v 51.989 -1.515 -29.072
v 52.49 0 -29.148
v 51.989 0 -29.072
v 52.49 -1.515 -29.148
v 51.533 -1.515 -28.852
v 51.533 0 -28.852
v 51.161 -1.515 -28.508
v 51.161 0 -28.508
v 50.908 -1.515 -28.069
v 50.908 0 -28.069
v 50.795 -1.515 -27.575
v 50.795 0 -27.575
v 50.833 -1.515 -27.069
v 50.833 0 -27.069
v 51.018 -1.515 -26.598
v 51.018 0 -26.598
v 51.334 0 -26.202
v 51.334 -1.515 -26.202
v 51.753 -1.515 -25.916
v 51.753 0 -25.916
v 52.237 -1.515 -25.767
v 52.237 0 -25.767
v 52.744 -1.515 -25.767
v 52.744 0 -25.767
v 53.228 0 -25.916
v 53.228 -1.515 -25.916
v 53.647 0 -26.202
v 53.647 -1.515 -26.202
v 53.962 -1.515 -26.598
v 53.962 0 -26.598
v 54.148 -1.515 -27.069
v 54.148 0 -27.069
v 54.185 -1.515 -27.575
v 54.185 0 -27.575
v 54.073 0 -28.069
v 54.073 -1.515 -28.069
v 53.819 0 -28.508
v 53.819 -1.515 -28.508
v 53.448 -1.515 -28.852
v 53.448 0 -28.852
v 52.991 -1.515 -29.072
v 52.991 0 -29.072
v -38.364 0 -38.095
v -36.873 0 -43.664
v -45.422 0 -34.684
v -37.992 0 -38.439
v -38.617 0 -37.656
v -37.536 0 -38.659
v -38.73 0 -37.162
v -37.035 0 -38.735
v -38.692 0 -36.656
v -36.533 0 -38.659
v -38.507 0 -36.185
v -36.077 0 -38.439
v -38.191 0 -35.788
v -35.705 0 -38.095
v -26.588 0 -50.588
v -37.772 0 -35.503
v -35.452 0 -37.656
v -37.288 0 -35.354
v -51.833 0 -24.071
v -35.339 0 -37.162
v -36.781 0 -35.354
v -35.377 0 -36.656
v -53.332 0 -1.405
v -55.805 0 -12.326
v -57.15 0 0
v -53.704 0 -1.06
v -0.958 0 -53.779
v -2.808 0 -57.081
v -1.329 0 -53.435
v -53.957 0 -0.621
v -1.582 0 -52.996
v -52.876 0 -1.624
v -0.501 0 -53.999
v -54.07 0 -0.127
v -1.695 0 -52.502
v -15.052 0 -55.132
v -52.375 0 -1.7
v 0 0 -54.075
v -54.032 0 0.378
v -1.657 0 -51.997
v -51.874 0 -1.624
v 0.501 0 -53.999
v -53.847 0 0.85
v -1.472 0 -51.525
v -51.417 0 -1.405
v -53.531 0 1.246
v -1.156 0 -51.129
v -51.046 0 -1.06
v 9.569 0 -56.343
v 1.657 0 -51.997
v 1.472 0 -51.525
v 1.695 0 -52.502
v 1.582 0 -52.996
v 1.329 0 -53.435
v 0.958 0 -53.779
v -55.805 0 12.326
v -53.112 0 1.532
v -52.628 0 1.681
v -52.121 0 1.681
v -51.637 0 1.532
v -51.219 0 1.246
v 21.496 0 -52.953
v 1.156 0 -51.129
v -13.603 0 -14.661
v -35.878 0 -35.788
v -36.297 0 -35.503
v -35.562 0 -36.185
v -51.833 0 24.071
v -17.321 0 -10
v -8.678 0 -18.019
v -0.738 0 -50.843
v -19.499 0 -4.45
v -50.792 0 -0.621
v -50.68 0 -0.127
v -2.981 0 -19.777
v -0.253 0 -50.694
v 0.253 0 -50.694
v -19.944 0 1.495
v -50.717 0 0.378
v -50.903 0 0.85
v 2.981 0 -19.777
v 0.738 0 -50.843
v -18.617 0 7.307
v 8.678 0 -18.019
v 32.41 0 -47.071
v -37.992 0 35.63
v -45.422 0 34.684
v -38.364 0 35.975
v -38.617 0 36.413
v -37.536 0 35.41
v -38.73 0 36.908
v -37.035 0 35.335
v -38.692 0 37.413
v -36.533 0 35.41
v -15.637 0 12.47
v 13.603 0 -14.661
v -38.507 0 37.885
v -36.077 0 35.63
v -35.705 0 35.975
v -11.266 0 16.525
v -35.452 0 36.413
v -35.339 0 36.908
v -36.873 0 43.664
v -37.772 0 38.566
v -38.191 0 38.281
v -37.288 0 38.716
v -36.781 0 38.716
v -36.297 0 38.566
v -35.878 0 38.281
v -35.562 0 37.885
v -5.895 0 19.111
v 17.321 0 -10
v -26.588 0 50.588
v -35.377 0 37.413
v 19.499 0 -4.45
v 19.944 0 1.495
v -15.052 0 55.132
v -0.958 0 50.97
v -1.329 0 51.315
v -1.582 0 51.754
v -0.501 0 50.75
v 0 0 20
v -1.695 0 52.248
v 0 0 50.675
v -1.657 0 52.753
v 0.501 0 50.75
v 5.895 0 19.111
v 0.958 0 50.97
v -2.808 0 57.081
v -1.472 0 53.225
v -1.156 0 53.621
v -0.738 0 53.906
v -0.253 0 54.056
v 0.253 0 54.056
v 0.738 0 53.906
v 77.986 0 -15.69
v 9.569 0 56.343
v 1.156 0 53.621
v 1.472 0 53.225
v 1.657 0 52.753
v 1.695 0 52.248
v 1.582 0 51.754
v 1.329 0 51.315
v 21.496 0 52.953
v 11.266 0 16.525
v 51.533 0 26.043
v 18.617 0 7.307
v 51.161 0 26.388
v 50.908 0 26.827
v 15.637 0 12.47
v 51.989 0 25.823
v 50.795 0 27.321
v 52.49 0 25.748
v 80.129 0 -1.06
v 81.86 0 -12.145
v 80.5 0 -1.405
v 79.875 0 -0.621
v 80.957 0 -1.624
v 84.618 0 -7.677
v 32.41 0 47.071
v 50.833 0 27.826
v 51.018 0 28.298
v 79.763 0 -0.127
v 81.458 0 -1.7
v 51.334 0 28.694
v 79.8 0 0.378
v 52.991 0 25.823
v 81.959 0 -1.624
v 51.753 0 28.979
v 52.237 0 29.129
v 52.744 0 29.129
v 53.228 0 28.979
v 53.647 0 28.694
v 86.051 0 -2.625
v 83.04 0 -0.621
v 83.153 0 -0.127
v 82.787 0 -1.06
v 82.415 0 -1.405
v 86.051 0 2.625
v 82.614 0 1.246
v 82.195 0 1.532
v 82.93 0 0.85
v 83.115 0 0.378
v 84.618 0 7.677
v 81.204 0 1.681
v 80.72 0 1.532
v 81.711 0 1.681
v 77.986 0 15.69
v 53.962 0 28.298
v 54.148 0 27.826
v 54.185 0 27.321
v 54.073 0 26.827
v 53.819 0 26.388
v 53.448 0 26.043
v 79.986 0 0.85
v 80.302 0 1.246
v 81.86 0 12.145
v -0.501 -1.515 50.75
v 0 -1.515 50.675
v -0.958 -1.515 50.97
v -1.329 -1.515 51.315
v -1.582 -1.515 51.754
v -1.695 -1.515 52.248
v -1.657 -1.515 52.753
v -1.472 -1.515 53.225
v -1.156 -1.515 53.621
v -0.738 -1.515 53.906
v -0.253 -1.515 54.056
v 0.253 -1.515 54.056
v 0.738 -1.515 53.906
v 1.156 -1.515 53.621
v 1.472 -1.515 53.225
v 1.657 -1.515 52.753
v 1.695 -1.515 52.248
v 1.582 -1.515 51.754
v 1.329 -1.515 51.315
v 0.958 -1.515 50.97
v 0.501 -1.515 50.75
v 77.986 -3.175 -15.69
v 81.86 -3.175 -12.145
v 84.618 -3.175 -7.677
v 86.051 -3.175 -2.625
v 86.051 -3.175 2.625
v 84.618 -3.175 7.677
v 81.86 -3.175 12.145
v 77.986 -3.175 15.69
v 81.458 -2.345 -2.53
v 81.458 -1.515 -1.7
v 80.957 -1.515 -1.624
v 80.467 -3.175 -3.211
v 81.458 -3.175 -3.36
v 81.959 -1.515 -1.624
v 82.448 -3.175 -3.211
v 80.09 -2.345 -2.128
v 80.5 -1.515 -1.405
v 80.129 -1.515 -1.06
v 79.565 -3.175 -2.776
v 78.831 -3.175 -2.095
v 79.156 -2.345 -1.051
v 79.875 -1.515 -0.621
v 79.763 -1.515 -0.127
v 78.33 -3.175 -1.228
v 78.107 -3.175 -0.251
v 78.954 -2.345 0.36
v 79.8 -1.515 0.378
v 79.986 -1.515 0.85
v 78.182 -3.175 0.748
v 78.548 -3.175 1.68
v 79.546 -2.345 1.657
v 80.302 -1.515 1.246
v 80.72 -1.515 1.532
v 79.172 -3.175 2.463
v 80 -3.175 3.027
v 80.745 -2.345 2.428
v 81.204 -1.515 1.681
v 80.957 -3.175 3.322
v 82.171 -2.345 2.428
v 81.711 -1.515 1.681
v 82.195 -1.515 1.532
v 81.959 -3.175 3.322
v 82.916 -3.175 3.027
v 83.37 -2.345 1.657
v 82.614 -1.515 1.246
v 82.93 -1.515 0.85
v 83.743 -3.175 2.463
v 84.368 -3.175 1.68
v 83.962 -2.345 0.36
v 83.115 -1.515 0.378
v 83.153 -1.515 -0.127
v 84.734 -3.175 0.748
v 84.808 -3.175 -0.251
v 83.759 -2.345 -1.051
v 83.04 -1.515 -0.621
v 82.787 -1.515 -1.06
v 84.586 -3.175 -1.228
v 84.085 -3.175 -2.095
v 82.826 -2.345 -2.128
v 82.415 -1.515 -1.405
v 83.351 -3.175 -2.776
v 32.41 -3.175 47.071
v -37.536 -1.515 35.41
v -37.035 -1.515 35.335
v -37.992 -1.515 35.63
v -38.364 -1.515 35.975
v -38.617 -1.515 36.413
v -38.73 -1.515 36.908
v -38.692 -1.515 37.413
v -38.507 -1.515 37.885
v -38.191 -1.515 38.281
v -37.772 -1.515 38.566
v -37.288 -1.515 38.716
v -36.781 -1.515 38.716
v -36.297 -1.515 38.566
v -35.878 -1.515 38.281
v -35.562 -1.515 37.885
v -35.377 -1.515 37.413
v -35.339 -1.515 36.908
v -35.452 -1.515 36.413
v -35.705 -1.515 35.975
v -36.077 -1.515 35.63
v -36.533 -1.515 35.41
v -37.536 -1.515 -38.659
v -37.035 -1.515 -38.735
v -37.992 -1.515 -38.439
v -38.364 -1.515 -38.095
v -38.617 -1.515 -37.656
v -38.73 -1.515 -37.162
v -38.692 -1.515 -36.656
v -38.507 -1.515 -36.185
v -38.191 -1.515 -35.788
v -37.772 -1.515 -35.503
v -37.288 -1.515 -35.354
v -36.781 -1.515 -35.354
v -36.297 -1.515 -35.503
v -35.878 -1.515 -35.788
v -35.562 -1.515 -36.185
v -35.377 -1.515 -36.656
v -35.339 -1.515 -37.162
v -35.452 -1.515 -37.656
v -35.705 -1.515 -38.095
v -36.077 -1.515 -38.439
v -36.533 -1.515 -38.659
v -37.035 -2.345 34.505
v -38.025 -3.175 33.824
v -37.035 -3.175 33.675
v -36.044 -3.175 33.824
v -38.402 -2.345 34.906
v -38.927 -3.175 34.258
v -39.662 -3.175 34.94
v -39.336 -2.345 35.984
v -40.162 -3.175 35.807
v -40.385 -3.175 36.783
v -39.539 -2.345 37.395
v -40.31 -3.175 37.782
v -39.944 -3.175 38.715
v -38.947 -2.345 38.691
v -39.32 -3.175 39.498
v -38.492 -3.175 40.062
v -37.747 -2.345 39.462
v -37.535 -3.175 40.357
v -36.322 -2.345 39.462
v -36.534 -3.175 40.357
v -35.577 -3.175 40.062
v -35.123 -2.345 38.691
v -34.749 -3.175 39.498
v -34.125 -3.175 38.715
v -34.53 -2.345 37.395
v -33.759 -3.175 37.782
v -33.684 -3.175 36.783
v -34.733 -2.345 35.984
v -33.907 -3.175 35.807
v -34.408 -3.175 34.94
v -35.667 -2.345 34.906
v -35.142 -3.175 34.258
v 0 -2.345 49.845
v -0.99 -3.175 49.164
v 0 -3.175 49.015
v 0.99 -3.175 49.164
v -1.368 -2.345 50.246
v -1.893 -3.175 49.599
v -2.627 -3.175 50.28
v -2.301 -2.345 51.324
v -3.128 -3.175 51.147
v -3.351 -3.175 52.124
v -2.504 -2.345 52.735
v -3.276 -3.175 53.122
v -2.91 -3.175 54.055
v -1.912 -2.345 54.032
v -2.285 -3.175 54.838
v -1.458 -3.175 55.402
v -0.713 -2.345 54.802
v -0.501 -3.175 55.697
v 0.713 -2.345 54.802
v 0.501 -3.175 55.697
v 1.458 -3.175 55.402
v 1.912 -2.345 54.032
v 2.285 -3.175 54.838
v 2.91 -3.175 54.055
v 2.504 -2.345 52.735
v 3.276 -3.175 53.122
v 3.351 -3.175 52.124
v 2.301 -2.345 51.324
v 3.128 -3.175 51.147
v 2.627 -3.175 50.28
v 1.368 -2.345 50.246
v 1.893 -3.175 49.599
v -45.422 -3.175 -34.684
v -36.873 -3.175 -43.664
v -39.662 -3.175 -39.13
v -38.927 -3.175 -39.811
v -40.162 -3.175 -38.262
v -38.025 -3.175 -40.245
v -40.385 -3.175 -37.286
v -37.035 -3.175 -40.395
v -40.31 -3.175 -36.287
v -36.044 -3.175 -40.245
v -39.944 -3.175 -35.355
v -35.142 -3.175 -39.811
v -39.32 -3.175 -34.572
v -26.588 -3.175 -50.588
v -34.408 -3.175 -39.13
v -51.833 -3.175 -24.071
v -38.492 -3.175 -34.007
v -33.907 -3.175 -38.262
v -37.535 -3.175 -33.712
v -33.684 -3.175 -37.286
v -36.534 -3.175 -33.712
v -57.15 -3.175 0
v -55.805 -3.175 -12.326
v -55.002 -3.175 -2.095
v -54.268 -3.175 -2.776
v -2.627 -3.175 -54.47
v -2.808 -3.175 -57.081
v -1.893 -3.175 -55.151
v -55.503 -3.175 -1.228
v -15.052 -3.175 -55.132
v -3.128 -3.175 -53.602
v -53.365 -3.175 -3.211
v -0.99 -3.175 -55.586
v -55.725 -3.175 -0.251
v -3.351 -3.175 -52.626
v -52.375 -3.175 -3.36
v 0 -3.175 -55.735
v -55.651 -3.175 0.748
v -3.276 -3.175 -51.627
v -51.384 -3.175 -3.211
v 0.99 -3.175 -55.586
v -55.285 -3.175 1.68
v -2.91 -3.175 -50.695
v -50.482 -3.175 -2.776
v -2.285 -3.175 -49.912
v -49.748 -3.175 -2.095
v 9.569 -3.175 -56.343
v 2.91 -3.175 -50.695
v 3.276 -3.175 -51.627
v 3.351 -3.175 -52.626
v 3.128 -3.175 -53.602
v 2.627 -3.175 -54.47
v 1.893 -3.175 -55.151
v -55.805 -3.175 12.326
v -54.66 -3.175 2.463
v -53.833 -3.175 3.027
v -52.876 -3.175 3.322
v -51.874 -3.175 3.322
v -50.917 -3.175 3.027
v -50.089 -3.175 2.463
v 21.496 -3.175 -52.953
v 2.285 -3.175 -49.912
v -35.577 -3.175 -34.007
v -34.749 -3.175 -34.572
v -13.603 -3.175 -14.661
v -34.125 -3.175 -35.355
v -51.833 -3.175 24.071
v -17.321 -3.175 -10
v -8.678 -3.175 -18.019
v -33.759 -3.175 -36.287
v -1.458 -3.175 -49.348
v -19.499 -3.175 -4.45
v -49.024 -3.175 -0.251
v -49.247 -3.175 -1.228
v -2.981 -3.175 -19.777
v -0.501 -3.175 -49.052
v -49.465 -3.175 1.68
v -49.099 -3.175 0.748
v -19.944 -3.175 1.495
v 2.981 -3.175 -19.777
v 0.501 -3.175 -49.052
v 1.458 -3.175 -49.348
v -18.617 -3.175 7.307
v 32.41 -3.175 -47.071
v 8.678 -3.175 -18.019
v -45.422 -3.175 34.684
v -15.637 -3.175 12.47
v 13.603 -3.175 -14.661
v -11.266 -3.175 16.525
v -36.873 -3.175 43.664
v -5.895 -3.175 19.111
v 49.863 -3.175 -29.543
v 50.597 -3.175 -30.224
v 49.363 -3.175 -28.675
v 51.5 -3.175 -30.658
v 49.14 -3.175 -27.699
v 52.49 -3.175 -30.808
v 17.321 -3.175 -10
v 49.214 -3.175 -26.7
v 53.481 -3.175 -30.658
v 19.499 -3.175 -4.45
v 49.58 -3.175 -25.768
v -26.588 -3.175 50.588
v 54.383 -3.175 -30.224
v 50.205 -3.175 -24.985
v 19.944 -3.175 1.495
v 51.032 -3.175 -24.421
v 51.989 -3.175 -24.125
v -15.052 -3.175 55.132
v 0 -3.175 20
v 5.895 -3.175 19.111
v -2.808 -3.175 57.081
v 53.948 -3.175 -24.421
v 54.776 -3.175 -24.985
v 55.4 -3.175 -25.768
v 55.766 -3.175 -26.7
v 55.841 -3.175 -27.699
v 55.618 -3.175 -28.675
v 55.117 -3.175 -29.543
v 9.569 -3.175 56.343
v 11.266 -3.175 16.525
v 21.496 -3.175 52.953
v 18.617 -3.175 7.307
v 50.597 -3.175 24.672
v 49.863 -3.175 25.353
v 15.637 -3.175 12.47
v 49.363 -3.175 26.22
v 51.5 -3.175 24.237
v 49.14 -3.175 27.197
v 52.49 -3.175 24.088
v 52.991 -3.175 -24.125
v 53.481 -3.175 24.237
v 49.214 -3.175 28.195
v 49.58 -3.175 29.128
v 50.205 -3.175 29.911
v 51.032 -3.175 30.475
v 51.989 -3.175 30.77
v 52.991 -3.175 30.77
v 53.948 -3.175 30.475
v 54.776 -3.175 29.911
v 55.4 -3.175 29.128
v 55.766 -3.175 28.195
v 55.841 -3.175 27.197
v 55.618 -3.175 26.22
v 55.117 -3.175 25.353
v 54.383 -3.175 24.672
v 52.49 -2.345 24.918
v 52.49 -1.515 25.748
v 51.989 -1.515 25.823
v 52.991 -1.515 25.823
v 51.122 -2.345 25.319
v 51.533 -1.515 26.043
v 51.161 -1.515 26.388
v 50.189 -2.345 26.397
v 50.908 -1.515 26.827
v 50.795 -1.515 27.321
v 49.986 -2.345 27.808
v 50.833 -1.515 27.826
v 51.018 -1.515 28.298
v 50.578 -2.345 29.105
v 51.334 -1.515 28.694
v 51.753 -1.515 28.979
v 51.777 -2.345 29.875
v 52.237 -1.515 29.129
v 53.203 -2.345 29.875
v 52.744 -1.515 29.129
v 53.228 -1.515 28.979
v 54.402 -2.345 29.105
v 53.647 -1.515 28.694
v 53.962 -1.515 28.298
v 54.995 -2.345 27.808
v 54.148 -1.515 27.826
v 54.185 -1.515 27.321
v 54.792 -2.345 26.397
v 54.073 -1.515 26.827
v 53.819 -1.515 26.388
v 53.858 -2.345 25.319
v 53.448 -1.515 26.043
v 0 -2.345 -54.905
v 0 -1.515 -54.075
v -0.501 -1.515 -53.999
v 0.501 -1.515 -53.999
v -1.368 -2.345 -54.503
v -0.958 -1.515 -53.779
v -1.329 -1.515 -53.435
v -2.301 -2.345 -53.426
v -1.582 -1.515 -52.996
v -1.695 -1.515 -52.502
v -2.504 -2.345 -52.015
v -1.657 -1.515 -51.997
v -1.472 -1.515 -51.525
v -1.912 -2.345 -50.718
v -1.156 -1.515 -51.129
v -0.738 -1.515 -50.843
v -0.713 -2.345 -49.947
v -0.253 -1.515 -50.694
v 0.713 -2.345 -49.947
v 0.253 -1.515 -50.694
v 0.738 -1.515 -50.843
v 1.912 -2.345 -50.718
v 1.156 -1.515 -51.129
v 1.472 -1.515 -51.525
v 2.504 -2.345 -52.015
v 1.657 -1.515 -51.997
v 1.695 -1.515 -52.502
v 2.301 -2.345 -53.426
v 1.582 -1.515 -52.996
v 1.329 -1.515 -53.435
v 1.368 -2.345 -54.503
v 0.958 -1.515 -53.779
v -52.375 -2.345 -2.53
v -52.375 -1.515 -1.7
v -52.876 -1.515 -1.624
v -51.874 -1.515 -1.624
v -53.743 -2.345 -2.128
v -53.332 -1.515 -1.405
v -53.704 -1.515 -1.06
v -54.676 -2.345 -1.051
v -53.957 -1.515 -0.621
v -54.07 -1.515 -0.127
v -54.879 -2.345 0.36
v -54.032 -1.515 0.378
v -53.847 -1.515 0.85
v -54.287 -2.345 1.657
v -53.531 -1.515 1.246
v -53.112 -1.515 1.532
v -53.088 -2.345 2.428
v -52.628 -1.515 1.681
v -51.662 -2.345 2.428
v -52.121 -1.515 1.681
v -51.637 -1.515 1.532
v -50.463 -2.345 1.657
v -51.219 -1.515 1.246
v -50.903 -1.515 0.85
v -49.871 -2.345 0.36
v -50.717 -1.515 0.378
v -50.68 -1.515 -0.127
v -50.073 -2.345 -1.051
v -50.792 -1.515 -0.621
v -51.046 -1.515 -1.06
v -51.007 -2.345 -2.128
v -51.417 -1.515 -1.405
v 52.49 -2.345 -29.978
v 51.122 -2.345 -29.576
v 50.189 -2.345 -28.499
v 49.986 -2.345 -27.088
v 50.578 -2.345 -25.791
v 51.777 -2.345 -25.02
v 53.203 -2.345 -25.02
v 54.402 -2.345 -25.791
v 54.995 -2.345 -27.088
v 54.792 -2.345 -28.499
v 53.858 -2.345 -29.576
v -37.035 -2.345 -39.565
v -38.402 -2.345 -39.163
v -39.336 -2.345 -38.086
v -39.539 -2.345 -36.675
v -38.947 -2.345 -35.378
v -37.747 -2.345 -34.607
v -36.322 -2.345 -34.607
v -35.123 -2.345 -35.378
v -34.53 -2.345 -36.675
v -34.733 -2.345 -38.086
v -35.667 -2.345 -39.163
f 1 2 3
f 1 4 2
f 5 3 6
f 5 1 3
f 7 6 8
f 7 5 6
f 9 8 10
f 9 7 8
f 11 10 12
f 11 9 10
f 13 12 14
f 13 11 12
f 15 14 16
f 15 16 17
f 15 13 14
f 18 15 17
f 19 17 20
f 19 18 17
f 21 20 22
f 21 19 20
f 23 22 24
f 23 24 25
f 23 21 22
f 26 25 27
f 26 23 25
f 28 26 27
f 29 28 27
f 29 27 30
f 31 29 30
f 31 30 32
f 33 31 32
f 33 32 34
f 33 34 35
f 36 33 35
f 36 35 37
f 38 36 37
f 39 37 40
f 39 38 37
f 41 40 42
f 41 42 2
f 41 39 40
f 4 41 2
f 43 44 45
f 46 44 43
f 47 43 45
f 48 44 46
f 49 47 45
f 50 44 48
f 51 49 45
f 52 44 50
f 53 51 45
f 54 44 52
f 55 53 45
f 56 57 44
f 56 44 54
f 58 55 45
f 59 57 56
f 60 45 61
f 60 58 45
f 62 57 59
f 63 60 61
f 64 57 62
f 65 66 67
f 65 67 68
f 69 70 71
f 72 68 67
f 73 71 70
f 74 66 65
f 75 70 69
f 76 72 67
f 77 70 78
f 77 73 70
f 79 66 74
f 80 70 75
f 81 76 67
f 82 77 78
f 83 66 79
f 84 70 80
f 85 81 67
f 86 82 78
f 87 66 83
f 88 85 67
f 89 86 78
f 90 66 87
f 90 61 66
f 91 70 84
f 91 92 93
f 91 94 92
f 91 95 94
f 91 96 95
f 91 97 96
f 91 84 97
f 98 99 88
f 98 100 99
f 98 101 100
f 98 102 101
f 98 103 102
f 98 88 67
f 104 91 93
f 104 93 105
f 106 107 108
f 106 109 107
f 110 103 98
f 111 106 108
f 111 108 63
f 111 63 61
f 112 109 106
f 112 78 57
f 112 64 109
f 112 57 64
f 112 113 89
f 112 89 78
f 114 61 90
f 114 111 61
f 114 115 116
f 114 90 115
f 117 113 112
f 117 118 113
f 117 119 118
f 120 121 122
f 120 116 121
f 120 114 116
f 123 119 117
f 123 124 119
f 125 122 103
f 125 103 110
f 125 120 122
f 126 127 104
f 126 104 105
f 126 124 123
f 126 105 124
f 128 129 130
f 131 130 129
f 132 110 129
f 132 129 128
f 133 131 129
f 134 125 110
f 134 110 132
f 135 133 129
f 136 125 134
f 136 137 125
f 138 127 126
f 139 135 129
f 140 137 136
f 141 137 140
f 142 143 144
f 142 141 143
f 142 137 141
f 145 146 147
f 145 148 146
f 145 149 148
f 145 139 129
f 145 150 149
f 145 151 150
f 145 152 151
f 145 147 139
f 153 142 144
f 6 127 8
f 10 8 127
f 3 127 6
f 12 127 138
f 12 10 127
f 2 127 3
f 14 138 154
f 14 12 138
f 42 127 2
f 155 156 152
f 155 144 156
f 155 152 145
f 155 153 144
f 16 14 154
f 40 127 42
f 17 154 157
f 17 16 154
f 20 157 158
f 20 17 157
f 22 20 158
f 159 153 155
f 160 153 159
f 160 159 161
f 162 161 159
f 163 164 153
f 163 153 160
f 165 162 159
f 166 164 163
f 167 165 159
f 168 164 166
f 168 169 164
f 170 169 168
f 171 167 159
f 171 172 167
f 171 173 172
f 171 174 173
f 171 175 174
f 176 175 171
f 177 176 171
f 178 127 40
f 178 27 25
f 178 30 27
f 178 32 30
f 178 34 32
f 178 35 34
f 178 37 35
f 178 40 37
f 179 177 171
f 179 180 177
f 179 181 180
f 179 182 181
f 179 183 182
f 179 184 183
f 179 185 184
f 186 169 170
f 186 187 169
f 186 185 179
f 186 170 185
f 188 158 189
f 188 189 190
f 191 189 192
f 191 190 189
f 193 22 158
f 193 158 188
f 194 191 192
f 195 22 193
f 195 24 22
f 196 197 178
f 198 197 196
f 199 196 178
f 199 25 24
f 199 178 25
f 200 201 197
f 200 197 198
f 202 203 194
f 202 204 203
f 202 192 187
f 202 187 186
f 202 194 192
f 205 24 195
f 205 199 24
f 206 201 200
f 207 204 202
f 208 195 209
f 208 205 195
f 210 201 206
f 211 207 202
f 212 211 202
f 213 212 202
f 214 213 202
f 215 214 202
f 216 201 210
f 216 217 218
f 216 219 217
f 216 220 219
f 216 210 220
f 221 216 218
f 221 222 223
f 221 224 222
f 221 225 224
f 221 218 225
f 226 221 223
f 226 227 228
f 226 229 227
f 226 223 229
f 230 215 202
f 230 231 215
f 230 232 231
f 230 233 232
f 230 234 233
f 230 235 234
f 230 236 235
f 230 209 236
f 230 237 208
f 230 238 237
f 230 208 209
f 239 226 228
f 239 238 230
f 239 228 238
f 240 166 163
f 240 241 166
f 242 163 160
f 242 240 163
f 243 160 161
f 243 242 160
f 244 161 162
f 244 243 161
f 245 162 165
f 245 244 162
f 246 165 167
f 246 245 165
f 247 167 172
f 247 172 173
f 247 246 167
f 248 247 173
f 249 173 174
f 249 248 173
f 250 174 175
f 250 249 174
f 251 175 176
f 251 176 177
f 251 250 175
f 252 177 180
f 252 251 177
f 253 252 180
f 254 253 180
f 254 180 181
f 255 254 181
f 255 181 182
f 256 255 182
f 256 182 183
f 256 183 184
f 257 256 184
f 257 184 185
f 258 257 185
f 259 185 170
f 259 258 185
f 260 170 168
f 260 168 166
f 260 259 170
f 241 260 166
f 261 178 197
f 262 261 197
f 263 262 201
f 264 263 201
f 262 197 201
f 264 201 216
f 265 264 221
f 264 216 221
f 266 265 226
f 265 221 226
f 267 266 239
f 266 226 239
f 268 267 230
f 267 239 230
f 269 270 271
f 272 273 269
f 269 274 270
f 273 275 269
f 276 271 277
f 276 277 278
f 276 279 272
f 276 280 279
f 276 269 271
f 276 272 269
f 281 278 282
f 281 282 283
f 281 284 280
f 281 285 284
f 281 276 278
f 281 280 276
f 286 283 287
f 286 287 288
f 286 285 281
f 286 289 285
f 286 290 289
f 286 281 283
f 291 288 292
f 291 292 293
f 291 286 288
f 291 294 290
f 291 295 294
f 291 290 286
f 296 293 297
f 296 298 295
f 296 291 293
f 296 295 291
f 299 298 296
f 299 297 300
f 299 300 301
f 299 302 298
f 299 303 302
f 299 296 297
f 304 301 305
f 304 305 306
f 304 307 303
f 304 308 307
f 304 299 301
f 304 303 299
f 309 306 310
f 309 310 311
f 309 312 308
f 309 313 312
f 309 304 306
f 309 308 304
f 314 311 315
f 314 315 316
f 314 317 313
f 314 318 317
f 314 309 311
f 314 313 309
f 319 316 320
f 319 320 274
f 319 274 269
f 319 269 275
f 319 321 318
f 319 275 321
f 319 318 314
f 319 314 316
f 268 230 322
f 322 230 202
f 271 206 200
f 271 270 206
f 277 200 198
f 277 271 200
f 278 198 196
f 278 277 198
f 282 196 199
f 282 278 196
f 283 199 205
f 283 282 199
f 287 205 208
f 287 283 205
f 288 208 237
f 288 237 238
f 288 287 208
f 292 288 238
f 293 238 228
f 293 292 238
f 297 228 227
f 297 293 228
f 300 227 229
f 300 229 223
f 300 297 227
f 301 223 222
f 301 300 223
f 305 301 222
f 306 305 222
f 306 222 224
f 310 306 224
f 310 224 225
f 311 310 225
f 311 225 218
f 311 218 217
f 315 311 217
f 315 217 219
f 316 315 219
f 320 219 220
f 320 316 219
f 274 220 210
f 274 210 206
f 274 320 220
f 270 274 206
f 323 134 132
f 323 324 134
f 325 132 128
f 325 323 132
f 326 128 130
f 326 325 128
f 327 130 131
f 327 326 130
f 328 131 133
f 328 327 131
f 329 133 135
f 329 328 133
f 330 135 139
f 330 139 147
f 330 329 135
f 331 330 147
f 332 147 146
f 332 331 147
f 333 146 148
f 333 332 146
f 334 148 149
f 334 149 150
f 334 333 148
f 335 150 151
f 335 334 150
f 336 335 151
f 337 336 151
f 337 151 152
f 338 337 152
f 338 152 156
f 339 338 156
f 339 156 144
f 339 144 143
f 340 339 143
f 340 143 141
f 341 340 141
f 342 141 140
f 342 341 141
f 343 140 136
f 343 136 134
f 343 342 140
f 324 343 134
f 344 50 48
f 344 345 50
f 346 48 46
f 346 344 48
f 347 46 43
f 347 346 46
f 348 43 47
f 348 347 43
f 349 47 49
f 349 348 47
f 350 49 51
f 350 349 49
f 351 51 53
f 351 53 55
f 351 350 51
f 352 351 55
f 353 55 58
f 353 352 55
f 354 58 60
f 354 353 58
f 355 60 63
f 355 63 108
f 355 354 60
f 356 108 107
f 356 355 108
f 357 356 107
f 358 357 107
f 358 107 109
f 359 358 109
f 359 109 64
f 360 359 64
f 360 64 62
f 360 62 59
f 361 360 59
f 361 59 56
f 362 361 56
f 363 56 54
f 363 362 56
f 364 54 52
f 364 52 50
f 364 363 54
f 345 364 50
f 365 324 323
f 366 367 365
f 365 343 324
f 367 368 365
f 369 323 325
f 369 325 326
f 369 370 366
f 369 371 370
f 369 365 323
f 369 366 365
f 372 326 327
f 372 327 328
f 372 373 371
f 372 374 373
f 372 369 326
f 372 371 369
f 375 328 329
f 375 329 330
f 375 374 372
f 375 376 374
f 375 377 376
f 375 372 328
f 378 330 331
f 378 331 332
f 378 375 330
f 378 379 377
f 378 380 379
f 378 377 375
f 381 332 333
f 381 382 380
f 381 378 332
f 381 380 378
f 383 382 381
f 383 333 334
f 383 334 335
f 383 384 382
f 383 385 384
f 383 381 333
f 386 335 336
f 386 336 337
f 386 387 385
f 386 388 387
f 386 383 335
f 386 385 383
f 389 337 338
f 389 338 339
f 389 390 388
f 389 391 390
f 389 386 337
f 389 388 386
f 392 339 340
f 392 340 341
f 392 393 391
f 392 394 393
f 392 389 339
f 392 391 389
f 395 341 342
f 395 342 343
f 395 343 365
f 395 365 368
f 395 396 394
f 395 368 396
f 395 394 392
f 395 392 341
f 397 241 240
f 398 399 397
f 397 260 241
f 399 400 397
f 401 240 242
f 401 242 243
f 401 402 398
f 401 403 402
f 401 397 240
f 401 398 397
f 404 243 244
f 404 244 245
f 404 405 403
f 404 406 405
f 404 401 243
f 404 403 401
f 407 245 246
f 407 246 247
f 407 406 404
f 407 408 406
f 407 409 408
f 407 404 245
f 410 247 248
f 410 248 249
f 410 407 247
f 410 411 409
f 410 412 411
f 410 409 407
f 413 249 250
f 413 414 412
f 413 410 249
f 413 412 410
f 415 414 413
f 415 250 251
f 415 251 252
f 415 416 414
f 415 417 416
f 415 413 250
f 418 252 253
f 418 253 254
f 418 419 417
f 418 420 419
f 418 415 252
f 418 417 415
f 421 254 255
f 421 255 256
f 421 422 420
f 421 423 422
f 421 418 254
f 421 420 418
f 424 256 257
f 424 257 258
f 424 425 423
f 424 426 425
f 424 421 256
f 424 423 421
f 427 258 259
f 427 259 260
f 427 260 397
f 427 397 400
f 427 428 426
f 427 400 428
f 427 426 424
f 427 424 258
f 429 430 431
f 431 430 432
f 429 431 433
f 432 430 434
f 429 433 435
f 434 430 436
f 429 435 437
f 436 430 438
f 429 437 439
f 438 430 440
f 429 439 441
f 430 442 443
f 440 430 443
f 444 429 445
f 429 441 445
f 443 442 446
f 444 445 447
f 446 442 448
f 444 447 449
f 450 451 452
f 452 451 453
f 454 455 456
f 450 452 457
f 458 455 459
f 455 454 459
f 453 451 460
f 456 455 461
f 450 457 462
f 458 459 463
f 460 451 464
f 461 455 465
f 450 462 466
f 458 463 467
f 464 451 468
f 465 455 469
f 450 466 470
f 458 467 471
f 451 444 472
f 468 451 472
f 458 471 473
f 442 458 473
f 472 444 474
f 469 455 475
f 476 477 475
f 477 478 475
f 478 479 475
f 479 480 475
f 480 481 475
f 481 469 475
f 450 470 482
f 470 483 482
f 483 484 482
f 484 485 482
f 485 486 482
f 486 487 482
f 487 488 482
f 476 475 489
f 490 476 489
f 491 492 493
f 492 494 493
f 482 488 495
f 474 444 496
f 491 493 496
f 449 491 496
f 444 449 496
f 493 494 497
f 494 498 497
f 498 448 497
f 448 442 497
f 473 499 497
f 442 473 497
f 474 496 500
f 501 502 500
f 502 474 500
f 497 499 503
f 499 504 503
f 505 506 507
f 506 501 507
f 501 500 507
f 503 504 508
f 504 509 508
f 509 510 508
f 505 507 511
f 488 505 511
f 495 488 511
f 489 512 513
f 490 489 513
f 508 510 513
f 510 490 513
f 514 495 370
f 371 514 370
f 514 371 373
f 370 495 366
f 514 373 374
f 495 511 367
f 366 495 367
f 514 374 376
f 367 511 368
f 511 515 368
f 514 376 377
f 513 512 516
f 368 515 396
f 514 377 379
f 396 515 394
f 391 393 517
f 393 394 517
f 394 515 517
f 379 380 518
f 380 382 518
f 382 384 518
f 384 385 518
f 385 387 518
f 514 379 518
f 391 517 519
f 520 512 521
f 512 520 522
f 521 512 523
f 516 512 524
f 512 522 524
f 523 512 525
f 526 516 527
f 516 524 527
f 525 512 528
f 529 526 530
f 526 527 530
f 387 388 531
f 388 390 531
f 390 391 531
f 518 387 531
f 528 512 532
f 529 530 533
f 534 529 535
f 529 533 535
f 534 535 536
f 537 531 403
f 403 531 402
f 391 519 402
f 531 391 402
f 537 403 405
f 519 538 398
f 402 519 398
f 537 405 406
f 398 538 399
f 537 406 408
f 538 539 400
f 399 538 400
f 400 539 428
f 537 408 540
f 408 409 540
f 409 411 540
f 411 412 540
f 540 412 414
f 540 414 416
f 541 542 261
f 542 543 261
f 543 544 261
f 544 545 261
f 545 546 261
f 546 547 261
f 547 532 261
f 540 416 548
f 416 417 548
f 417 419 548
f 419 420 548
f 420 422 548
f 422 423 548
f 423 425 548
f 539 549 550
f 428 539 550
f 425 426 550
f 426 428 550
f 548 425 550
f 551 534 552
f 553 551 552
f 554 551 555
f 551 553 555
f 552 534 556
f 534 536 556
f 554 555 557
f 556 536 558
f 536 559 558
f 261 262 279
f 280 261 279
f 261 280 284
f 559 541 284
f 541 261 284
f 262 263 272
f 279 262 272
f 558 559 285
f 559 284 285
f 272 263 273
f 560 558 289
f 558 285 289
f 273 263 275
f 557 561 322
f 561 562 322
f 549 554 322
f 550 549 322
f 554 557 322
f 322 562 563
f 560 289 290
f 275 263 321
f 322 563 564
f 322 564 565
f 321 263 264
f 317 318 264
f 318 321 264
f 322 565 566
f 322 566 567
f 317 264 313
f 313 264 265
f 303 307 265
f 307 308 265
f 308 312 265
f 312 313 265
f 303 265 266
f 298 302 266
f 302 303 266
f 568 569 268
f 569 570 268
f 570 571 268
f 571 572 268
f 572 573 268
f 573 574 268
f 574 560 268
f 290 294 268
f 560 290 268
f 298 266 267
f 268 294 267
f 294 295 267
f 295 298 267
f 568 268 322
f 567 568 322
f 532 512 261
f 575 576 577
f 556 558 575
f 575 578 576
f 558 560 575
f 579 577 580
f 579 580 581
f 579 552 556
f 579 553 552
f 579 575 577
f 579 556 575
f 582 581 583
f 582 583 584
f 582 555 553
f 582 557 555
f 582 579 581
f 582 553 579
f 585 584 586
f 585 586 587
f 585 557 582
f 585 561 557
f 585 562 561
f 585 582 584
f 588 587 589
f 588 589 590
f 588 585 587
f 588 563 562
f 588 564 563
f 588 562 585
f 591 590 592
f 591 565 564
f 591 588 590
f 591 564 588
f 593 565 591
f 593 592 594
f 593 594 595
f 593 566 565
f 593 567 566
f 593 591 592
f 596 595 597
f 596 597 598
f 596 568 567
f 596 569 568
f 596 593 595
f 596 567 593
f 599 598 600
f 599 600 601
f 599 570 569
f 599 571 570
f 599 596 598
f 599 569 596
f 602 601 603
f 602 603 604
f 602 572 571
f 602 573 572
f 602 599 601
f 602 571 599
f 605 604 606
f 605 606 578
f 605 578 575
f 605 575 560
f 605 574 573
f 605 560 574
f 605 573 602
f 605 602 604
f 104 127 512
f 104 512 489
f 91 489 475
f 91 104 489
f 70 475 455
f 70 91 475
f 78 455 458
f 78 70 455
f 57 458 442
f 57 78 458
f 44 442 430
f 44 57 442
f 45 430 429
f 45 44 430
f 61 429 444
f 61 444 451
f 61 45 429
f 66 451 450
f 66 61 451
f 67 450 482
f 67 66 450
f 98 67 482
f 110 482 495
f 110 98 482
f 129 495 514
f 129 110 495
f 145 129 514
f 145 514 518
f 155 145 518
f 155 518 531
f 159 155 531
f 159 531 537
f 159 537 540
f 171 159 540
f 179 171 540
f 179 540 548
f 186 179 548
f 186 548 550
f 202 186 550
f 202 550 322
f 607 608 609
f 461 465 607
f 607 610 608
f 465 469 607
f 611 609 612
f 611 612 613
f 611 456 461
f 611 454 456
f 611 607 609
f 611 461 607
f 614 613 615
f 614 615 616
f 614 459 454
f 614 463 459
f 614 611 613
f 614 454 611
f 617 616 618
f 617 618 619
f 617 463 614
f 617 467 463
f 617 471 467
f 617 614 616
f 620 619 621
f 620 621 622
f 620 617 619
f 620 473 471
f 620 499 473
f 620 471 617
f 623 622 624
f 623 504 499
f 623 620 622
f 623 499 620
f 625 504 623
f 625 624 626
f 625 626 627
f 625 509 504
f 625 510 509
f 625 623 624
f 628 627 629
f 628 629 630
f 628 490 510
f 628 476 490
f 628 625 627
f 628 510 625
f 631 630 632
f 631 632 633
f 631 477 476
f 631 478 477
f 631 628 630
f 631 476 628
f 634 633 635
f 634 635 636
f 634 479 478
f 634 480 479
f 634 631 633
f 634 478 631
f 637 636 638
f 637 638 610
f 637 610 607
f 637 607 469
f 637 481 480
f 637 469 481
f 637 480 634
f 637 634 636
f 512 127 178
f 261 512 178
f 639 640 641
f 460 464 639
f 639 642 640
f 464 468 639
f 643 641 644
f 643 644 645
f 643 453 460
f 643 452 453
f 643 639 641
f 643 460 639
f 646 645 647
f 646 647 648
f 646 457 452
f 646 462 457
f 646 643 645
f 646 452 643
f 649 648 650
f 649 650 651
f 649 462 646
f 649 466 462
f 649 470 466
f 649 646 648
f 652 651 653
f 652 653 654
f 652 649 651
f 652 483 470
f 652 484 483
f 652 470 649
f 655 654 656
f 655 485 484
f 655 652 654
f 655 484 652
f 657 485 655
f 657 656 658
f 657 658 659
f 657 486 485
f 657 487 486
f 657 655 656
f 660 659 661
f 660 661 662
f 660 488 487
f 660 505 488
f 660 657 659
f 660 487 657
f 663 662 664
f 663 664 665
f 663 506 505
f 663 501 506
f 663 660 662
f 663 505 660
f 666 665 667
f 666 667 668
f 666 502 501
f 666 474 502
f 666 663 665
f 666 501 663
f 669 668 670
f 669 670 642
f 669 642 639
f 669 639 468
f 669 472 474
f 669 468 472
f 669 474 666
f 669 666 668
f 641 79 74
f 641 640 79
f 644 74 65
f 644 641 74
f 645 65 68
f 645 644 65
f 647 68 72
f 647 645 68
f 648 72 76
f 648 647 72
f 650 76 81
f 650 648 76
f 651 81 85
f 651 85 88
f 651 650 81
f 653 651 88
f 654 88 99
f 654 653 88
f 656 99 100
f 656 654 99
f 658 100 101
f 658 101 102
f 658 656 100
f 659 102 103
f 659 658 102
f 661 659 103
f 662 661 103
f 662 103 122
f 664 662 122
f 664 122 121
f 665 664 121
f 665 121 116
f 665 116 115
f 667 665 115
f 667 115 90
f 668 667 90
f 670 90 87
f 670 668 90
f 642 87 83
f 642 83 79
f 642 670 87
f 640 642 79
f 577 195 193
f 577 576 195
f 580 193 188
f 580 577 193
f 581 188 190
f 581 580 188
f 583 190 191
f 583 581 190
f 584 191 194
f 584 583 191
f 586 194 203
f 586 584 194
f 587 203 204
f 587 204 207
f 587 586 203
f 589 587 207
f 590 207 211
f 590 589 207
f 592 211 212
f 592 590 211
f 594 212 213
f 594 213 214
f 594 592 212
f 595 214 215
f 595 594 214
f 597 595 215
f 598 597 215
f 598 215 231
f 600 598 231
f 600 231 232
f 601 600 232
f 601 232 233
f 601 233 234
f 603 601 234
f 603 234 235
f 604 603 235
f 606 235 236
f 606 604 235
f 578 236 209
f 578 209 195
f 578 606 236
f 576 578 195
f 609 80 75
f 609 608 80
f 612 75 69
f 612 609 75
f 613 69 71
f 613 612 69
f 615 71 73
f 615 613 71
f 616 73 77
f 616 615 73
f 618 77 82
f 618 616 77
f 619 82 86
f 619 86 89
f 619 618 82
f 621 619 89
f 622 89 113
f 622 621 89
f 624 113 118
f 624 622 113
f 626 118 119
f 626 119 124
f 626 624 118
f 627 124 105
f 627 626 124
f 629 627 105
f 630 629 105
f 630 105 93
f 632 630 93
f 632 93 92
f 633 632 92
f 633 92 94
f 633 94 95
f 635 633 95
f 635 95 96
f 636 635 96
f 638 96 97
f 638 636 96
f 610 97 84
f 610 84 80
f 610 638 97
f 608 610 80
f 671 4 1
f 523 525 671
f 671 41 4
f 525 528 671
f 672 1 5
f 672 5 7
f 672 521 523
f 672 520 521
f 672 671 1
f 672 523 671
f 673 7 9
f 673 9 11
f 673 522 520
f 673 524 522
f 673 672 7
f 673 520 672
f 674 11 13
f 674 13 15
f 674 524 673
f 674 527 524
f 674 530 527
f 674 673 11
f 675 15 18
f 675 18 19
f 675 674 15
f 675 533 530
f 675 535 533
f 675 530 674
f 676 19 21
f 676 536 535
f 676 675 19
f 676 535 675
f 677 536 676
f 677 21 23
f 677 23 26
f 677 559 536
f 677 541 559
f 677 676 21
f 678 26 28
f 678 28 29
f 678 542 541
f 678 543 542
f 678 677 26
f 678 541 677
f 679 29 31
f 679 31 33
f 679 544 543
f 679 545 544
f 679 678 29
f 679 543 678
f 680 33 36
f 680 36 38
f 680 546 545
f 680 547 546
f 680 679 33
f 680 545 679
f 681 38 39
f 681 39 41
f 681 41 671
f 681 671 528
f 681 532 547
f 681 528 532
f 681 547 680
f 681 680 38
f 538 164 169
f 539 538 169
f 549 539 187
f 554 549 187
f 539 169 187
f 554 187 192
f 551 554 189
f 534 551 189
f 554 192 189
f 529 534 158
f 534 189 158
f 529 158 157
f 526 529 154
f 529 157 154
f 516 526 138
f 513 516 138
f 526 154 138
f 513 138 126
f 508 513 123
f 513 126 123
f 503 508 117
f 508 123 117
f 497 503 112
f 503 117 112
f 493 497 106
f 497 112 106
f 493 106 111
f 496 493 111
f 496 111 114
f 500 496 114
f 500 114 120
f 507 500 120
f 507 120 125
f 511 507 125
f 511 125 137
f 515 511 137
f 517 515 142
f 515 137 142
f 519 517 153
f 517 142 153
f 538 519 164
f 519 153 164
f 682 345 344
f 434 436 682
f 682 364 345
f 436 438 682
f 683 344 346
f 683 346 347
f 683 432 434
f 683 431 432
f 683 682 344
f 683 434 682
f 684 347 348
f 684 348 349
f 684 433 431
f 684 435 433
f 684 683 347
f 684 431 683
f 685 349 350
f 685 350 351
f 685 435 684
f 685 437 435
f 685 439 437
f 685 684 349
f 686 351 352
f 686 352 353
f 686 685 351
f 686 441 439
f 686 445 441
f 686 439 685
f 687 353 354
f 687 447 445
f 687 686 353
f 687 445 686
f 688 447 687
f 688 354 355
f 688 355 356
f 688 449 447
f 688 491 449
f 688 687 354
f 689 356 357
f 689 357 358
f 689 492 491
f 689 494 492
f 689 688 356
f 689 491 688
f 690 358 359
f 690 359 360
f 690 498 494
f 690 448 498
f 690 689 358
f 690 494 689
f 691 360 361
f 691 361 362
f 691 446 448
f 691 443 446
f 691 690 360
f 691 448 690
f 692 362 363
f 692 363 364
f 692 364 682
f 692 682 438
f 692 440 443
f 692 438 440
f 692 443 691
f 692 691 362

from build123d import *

# Parameters (mm, degrees)
SKETCH1_R                    = 57.15
SKETCH1_R_2                  = 20
BOSS_EXTRUDE1_DEPTH          = 3.175
BOSS_EXTRUDE2_START          = -3.175
BOSS_EXTRUDE2_DEPTH          = 3.175
CSK_FOR_M3_SFHCS1_AT_2_COUNT = 2
CSK_FOR_M3_SFHCS1_AT_2_PITCH = 74.069152487
CSK_FOR_M3_SFHCS1_AT_3_COUNT = 2
CSK_FOR_M3_SFHCS1_AT_3_PITCH = 96.776011479
CSK_FOR_M3_SFHCS1_AT_4_COUNT = 2
CSK_FOR_M3_SFHCS1_AT_4_PITCH = 104.7496
CSK_FOR_M3_SFHCS1_AT_5_COUNT = 2
CSK_FOR_M3_SFHCS1_AT_5_PITCH = 95.534640107
CSK_FOR_M3_SFHCS1_AT_6_COUNT = 2
CSK_FOR_M3_SFHCS1_AT_6_PITCH = 96.842619006
CSK_FOR_M3_SFHCS1_AT_7_COUNT = 2
CSK_FOR_M3_SFHCS1_AT_7_PITCH = 58.10838136
CSK_FOR_M3_SFHCS1_AT_8_COUNT = 2
CSK_FOR_M3_SFHCS1_AT_8_PITCH = 40.085936467


with BuildPart() as part:
    # Sketch1 → Boss-Extrude1 (new body)
    with BuildSketch(Plane(origin=(0, 0, 0), x_dir=(1, 0, 0), z_dir=(0, 1, 0))):
        with Locations(Location((0, 0, 0), (0, 0, 270))):
            Circle(SKETCH1_R)
        with Locations(Location((0, 0, 0), (0, 0, 270))):
            Circle(SKETCH1_R_2, mode=Mode.SUBTRACT)
    extrude(amount=-BOSS_EXTRUDE1_DEPTH)

    # Sketch2 → Boss-Extrude2 (add)
    with BuildSketch(Plane(origin=(0, -3.175, 0), x_dir=(-1, 0, 0), z_dir=(0, -1, 0)).offset(BOSS_EXTRUDE2_START)):
        with BuildLine():
            Line((-32.41020794, 47.071232418), (-77.986402647, 15.690410806))
            ThreePointArc((-77.986402647, 15.690410806), (-86.233, 0), (-77.986402647, -15.690410806))
            Line((-77.986402647, -15.690410806), (-32.41020794, -47.071232418))
            ThreePointArc((-32.41020794, -47.071232418), (-57.15, 0), (-32.41020794, 47.071232418))
        make_face()
    extrude(amount=BOSS_EXTRUDE2_DEPTH)

    # Sketch7 → CSK for M3 SFHCS1 (revolve, cut)
    with BuildSketch(Plane(origin=(0, -3.175, 52.3748), x_dir=(0, 0, -1), z_dir=(1, 0, 0))):
        Polygon((0, 0), (0, 3.175), (1.7, 3.175), (1.7, 1.66), (3.36, 0), align=None)
    csk_for_m3_sfhcs1 = revolve(axis=Axis((0, -9.525, 52.3748), (0, 1, 0)), mode=Mode.SUBTRACT)

    # CSK for M3 SFHCS1 at 2: CSK for M3 SFHCS1 ×2
    with Locations(*[Vector(-0.7071067811865477, 0, -0.7071067811865475) * (i * CSK_FOR_M3_SFHCS1_AT_2_PITCH) for i in range(1, CSK_FOR_M3_SFHCS1_AT_2_COUNT)]):
        add(csk_for_m3_sfhcs1, mode=Mode.SUBTRACT)

    # CSK for M3 SFHCS1 at 3: CSK for M3 SFHCS1 ×2
    with Locations(*[Vector(-0.3826834323650908, 0, -0.9238795325112864) * (i * CSK_FOR_M3_SFHCS1_AT_3_PITCH) for i in range(1, CSK_FOR_M3_SFHCS1_AT_3_COUNT)]):
        add(csk_for_m3_sfhcs1, mode=Mode.SUBTRACT)

    # CSK for M3 SFHCS1 at 4: CSK for M3 SFHCS1 ×2
    with Locations(*[(0, 0, -i * CSK_FOR_M3_SFHCS1_AT_4_PITCH) for i in range(1, CSK_FOR_M3_SFHCS1_AT_4_COUNT)]):
        add(csk_for_m3_sfhcs1, mode=Mode.SUBTRACT)

    # CSK for M3 SFHCS1 at 5: CSK for M3 SFHCS1 ×2
    with Locations(*[Vector(0.5494368566637676, 0, -0.8355352419493978) * (i * CSK_FOR_M3_SFHCS1_AT_5_PITCH) for i in range(1, CSK_FOR_M3_SFHCS1_AT_5_COUNT)]):
        add(csk_for_m3_sfhcs1, mode=Mode.SUBTRACT)

    # CSK for M3 SFHCS1 at 6: CSK for M3 SFHCS1 ×2
    with Locations(*[Vector(0.84113586390326, 0, -0.5408238700868485) * (i * CSK_FOR_M3_SFHCS1_AT_6_PITCH) for i in range(1, CSK_FOR_M3_SFHCS1_AT_6_COUNT)]):
        add(csk_for_m3_sfhcs1, mode=Mode.SUBTRACT)

    # CSK for M3 SFHCS1 at 7: CSK for M3 SFHCS1 ×2
    with Locations(*[Vector(0.9033163742395407, 0, -0.42897497366481663) * (i * CSK_FOR_M3_SFHCS1_AT_7_PITCH) for i in range(1, CSK_FOR_M3_SFHCS1_AT_7_COUNT)]):
        add(csk_for_m3_sfhcs1, mode=Mode.SUBTRACT)

    # CSK for M3 SFHCS1 at 8: CSK for M3 SFHCS1 ×2
    with Locations(*[Vector(-0.9238795325112864, 0, -0.3826834323650906) * (i * CSK_FOR_M3_SFHCS1_AT_8_PITCH) for i in range(1, CSK_FOR_M3_SFHCS1_AT_8_COUNT)]):
        add(csk_for_m3_sfhcs1, mode=Mode.SUBTRACT)


solid = part.part
